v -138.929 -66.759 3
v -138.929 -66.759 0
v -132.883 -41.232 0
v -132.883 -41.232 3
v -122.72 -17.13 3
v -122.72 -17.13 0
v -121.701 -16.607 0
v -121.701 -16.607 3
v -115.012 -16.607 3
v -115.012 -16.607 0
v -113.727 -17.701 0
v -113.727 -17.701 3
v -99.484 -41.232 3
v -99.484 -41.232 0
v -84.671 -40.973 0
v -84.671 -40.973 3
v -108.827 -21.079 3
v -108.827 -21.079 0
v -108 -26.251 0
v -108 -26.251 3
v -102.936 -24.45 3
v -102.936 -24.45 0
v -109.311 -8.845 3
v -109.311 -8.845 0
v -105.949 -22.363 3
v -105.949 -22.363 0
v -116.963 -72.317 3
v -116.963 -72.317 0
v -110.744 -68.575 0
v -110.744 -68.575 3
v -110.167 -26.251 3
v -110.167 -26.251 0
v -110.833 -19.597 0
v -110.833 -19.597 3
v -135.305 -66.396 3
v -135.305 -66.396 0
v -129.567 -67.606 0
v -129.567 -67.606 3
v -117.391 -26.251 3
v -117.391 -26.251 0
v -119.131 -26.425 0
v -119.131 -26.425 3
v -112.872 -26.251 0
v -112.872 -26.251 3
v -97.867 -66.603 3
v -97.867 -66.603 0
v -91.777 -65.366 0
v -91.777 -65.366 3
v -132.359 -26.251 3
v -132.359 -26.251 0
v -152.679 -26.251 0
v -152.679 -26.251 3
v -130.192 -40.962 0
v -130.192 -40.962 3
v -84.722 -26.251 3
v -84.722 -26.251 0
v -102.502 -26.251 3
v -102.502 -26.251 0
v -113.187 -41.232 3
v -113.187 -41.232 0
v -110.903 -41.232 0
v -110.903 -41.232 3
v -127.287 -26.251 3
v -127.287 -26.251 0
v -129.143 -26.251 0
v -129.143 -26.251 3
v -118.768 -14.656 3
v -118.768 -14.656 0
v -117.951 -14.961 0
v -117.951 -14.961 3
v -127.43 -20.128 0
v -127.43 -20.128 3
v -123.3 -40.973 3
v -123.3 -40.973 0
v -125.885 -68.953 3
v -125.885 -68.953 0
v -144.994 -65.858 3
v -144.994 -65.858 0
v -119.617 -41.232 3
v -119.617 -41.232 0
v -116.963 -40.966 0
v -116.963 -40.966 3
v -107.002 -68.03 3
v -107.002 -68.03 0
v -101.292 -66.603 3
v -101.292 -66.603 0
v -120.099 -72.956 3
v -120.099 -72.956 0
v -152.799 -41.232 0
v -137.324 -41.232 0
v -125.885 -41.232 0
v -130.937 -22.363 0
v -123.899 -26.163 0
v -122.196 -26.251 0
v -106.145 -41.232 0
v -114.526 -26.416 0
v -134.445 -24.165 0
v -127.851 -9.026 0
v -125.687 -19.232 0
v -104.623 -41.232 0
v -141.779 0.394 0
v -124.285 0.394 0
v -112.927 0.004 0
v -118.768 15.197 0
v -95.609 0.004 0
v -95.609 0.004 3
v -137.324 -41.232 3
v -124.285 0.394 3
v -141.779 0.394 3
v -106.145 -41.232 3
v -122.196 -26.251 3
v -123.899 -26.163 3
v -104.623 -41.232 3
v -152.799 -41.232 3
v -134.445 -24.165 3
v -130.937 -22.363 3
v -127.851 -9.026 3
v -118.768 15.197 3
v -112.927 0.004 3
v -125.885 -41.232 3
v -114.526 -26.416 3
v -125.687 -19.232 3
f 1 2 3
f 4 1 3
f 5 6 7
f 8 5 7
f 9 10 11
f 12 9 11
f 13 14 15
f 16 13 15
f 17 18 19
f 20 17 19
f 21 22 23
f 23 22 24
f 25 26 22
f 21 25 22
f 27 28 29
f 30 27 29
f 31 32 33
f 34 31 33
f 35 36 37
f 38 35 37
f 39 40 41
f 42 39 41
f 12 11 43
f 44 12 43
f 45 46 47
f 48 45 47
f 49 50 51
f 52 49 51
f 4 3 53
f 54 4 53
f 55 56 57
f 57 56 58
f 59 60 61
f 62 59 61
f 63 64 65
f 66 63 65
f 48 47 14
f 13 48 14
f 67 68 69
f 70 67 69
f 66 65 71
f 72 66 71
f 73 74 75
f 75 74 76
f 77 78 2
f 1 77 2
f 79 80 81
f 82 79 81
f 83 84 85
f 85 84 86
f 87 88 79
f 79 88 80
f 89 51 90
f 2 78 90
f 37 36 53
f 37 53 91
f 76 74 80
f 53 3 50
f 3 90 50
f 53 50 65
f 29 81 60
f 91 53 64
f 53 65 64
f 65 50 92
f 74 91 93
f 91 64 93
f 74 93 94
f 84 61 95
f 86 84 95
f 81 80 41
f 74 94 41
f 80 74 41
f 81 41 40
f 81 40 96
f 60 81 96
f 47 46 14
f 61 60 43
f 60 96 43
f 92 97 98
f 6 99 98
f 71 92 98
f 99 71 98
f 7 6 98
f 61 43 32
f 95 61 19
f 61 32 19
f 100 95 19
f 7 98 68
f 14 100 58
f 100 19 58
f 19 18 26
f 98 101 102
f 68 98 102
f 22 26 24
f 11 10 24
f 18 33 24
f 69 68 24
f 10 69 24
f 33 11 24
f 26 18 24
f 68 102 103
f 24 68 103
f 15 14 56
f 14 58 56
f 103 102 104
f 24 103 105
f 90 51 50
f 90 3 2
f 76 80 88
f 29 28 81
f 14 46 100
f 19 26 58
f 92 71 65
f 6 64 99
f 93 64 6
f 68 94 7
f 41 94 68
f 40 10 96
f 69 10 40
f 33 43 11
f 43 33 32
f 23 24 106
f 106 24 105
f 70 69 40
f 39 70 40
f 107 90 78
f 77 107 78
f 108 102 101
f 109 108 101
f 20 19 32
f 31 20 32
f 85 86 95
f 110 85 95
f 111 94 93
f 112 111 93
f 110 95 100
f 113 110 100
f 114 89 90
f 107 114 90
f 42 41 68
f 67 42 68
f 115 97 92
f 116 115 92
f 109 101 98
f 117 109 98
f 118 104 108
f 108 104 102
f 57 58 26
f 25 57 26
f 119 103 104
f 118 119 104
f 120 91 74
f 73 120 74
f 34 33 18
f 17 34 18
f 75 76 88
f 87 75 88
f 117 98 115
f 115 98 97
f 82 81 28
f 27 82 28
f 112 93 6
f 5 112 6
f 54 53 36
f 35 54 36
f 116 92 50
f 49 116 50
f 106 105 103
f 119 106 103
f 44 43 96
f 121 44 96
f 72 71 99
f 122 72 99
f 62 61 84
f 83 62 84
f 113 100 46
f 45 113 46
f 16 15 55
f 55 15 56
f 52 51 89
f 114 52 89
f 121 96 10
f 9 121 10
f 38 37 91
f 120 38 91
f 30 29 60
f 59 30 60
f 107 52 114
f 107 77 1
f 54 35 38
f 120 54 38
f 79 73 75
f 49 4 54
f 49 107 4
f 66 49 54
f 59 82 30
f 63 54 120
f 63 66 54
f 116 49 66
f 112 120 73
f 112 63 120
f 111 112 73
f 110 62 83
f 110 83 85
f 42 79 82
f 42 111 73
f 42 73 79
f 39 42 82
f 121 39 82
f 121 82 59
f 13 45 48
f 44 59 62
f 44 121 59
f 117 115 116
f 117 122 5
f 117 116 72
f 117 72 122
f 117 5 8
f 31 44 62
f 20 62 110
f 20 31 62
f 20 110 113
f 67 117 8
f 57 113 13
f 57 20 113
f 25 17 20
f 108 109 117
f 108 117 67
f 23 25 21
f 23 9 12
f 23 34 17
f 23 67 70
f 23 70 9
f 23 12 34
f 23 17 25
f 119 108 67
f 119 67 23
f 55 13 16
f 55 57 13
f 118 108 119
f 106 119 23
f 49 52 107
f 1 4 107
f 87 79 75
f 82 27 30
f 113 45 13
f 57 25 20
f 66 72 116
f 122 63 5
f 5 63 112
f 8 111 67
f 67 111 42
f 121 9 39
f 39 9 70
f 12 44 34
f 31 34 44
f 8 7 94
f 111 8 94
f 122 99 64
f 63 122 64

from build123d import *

# Parameters (mm, degrees)
F1_DEPTH = 3


with BuildPart() as f1:
    # F0 (on Top) → F1 (new body)
    with BuildSketch(Plane.XY):
        Polygon((-112.926836, 0.004443), (-118.767626, 15.196789), (-124.284977, 0.394141), (-141.779017, 0.394141), (-127.85107, -9.025726), (-134.444977, -24.164799), (-130.936858, -22.362645), (-132.35915, -26.250625), (-152.67915, -26.250625), (-152.799174, -41.2316), (-137.323676, -41.2316), (-144.994139, -65.857825), (-138.929132, -66.758923), (-132.882882, -41.2316), (-130.191522, -40.962152), (-135.305133, -66.396103), (-129.567399, -67.605936), (-125.885266, -41.2316), (-123.300462, -40.97282), (-125.885266, -68.952925), (-120.098776, -72.956369), (-119.616715, -41.2316), (-116.962913, -40.965912), (-116.962913, -72.317163), (-110.744054, -68.574946), (-113.186582, -41.2316), (-110.90286, -41.2316), (-107.001505, -68.030101), (-101.292202, -66.602776), (-106.145109, -41.2316), (-104.622629, -41.2316), (-97.866622, -66.602776), (-91.776701, -65.36576), (-99.484258, -41.2316), (-84.670836, -40.97282), (-84.721535, -26.250625), (-102.501535, -26.250625), (-105.948821, -22.362645), (-102.935558, -24.450401), (-109.310944, -8.844978), (-95.608622, 0.004443), align=None)
        Polygon((-129.142605, -26.250625), (-127.429816, -20.12761), (-125.686861, -19.232238), (-127.287082, -26.250625), align=None, mode=Mode.SUBTRACT)
        Polygon((-123.898953, -26.163155), (-122.719641, -17.130227), (-121.70087, -16.606875), (-122.196288, -26.250625), align=None, mode=Mode.SUBTRACT)
        Polygon((-119.130578, -26.424788), (-118.767626, -14.656196), (-117.951181, -14.960507), (-117.390959, -26.250625), align=None, mode=Mode.SUBTRACT)
        Polygon((-114.525939, -26.416255), (-115.012083, -16.606875), (-113.727491, -17.701157), (-112.871551, -26.250625), align=None, mode=Mode.SUBTRACT)
        Polygon((-110.167341, -26.250625), (-110.833426, -19.597496), (-108.827006, -21.079161), (-107.999686, -26.250625), align=None, mode=Mode.SUBTRACT)
    extrude(amount=F1_DEPTH)


solid = f1.part
